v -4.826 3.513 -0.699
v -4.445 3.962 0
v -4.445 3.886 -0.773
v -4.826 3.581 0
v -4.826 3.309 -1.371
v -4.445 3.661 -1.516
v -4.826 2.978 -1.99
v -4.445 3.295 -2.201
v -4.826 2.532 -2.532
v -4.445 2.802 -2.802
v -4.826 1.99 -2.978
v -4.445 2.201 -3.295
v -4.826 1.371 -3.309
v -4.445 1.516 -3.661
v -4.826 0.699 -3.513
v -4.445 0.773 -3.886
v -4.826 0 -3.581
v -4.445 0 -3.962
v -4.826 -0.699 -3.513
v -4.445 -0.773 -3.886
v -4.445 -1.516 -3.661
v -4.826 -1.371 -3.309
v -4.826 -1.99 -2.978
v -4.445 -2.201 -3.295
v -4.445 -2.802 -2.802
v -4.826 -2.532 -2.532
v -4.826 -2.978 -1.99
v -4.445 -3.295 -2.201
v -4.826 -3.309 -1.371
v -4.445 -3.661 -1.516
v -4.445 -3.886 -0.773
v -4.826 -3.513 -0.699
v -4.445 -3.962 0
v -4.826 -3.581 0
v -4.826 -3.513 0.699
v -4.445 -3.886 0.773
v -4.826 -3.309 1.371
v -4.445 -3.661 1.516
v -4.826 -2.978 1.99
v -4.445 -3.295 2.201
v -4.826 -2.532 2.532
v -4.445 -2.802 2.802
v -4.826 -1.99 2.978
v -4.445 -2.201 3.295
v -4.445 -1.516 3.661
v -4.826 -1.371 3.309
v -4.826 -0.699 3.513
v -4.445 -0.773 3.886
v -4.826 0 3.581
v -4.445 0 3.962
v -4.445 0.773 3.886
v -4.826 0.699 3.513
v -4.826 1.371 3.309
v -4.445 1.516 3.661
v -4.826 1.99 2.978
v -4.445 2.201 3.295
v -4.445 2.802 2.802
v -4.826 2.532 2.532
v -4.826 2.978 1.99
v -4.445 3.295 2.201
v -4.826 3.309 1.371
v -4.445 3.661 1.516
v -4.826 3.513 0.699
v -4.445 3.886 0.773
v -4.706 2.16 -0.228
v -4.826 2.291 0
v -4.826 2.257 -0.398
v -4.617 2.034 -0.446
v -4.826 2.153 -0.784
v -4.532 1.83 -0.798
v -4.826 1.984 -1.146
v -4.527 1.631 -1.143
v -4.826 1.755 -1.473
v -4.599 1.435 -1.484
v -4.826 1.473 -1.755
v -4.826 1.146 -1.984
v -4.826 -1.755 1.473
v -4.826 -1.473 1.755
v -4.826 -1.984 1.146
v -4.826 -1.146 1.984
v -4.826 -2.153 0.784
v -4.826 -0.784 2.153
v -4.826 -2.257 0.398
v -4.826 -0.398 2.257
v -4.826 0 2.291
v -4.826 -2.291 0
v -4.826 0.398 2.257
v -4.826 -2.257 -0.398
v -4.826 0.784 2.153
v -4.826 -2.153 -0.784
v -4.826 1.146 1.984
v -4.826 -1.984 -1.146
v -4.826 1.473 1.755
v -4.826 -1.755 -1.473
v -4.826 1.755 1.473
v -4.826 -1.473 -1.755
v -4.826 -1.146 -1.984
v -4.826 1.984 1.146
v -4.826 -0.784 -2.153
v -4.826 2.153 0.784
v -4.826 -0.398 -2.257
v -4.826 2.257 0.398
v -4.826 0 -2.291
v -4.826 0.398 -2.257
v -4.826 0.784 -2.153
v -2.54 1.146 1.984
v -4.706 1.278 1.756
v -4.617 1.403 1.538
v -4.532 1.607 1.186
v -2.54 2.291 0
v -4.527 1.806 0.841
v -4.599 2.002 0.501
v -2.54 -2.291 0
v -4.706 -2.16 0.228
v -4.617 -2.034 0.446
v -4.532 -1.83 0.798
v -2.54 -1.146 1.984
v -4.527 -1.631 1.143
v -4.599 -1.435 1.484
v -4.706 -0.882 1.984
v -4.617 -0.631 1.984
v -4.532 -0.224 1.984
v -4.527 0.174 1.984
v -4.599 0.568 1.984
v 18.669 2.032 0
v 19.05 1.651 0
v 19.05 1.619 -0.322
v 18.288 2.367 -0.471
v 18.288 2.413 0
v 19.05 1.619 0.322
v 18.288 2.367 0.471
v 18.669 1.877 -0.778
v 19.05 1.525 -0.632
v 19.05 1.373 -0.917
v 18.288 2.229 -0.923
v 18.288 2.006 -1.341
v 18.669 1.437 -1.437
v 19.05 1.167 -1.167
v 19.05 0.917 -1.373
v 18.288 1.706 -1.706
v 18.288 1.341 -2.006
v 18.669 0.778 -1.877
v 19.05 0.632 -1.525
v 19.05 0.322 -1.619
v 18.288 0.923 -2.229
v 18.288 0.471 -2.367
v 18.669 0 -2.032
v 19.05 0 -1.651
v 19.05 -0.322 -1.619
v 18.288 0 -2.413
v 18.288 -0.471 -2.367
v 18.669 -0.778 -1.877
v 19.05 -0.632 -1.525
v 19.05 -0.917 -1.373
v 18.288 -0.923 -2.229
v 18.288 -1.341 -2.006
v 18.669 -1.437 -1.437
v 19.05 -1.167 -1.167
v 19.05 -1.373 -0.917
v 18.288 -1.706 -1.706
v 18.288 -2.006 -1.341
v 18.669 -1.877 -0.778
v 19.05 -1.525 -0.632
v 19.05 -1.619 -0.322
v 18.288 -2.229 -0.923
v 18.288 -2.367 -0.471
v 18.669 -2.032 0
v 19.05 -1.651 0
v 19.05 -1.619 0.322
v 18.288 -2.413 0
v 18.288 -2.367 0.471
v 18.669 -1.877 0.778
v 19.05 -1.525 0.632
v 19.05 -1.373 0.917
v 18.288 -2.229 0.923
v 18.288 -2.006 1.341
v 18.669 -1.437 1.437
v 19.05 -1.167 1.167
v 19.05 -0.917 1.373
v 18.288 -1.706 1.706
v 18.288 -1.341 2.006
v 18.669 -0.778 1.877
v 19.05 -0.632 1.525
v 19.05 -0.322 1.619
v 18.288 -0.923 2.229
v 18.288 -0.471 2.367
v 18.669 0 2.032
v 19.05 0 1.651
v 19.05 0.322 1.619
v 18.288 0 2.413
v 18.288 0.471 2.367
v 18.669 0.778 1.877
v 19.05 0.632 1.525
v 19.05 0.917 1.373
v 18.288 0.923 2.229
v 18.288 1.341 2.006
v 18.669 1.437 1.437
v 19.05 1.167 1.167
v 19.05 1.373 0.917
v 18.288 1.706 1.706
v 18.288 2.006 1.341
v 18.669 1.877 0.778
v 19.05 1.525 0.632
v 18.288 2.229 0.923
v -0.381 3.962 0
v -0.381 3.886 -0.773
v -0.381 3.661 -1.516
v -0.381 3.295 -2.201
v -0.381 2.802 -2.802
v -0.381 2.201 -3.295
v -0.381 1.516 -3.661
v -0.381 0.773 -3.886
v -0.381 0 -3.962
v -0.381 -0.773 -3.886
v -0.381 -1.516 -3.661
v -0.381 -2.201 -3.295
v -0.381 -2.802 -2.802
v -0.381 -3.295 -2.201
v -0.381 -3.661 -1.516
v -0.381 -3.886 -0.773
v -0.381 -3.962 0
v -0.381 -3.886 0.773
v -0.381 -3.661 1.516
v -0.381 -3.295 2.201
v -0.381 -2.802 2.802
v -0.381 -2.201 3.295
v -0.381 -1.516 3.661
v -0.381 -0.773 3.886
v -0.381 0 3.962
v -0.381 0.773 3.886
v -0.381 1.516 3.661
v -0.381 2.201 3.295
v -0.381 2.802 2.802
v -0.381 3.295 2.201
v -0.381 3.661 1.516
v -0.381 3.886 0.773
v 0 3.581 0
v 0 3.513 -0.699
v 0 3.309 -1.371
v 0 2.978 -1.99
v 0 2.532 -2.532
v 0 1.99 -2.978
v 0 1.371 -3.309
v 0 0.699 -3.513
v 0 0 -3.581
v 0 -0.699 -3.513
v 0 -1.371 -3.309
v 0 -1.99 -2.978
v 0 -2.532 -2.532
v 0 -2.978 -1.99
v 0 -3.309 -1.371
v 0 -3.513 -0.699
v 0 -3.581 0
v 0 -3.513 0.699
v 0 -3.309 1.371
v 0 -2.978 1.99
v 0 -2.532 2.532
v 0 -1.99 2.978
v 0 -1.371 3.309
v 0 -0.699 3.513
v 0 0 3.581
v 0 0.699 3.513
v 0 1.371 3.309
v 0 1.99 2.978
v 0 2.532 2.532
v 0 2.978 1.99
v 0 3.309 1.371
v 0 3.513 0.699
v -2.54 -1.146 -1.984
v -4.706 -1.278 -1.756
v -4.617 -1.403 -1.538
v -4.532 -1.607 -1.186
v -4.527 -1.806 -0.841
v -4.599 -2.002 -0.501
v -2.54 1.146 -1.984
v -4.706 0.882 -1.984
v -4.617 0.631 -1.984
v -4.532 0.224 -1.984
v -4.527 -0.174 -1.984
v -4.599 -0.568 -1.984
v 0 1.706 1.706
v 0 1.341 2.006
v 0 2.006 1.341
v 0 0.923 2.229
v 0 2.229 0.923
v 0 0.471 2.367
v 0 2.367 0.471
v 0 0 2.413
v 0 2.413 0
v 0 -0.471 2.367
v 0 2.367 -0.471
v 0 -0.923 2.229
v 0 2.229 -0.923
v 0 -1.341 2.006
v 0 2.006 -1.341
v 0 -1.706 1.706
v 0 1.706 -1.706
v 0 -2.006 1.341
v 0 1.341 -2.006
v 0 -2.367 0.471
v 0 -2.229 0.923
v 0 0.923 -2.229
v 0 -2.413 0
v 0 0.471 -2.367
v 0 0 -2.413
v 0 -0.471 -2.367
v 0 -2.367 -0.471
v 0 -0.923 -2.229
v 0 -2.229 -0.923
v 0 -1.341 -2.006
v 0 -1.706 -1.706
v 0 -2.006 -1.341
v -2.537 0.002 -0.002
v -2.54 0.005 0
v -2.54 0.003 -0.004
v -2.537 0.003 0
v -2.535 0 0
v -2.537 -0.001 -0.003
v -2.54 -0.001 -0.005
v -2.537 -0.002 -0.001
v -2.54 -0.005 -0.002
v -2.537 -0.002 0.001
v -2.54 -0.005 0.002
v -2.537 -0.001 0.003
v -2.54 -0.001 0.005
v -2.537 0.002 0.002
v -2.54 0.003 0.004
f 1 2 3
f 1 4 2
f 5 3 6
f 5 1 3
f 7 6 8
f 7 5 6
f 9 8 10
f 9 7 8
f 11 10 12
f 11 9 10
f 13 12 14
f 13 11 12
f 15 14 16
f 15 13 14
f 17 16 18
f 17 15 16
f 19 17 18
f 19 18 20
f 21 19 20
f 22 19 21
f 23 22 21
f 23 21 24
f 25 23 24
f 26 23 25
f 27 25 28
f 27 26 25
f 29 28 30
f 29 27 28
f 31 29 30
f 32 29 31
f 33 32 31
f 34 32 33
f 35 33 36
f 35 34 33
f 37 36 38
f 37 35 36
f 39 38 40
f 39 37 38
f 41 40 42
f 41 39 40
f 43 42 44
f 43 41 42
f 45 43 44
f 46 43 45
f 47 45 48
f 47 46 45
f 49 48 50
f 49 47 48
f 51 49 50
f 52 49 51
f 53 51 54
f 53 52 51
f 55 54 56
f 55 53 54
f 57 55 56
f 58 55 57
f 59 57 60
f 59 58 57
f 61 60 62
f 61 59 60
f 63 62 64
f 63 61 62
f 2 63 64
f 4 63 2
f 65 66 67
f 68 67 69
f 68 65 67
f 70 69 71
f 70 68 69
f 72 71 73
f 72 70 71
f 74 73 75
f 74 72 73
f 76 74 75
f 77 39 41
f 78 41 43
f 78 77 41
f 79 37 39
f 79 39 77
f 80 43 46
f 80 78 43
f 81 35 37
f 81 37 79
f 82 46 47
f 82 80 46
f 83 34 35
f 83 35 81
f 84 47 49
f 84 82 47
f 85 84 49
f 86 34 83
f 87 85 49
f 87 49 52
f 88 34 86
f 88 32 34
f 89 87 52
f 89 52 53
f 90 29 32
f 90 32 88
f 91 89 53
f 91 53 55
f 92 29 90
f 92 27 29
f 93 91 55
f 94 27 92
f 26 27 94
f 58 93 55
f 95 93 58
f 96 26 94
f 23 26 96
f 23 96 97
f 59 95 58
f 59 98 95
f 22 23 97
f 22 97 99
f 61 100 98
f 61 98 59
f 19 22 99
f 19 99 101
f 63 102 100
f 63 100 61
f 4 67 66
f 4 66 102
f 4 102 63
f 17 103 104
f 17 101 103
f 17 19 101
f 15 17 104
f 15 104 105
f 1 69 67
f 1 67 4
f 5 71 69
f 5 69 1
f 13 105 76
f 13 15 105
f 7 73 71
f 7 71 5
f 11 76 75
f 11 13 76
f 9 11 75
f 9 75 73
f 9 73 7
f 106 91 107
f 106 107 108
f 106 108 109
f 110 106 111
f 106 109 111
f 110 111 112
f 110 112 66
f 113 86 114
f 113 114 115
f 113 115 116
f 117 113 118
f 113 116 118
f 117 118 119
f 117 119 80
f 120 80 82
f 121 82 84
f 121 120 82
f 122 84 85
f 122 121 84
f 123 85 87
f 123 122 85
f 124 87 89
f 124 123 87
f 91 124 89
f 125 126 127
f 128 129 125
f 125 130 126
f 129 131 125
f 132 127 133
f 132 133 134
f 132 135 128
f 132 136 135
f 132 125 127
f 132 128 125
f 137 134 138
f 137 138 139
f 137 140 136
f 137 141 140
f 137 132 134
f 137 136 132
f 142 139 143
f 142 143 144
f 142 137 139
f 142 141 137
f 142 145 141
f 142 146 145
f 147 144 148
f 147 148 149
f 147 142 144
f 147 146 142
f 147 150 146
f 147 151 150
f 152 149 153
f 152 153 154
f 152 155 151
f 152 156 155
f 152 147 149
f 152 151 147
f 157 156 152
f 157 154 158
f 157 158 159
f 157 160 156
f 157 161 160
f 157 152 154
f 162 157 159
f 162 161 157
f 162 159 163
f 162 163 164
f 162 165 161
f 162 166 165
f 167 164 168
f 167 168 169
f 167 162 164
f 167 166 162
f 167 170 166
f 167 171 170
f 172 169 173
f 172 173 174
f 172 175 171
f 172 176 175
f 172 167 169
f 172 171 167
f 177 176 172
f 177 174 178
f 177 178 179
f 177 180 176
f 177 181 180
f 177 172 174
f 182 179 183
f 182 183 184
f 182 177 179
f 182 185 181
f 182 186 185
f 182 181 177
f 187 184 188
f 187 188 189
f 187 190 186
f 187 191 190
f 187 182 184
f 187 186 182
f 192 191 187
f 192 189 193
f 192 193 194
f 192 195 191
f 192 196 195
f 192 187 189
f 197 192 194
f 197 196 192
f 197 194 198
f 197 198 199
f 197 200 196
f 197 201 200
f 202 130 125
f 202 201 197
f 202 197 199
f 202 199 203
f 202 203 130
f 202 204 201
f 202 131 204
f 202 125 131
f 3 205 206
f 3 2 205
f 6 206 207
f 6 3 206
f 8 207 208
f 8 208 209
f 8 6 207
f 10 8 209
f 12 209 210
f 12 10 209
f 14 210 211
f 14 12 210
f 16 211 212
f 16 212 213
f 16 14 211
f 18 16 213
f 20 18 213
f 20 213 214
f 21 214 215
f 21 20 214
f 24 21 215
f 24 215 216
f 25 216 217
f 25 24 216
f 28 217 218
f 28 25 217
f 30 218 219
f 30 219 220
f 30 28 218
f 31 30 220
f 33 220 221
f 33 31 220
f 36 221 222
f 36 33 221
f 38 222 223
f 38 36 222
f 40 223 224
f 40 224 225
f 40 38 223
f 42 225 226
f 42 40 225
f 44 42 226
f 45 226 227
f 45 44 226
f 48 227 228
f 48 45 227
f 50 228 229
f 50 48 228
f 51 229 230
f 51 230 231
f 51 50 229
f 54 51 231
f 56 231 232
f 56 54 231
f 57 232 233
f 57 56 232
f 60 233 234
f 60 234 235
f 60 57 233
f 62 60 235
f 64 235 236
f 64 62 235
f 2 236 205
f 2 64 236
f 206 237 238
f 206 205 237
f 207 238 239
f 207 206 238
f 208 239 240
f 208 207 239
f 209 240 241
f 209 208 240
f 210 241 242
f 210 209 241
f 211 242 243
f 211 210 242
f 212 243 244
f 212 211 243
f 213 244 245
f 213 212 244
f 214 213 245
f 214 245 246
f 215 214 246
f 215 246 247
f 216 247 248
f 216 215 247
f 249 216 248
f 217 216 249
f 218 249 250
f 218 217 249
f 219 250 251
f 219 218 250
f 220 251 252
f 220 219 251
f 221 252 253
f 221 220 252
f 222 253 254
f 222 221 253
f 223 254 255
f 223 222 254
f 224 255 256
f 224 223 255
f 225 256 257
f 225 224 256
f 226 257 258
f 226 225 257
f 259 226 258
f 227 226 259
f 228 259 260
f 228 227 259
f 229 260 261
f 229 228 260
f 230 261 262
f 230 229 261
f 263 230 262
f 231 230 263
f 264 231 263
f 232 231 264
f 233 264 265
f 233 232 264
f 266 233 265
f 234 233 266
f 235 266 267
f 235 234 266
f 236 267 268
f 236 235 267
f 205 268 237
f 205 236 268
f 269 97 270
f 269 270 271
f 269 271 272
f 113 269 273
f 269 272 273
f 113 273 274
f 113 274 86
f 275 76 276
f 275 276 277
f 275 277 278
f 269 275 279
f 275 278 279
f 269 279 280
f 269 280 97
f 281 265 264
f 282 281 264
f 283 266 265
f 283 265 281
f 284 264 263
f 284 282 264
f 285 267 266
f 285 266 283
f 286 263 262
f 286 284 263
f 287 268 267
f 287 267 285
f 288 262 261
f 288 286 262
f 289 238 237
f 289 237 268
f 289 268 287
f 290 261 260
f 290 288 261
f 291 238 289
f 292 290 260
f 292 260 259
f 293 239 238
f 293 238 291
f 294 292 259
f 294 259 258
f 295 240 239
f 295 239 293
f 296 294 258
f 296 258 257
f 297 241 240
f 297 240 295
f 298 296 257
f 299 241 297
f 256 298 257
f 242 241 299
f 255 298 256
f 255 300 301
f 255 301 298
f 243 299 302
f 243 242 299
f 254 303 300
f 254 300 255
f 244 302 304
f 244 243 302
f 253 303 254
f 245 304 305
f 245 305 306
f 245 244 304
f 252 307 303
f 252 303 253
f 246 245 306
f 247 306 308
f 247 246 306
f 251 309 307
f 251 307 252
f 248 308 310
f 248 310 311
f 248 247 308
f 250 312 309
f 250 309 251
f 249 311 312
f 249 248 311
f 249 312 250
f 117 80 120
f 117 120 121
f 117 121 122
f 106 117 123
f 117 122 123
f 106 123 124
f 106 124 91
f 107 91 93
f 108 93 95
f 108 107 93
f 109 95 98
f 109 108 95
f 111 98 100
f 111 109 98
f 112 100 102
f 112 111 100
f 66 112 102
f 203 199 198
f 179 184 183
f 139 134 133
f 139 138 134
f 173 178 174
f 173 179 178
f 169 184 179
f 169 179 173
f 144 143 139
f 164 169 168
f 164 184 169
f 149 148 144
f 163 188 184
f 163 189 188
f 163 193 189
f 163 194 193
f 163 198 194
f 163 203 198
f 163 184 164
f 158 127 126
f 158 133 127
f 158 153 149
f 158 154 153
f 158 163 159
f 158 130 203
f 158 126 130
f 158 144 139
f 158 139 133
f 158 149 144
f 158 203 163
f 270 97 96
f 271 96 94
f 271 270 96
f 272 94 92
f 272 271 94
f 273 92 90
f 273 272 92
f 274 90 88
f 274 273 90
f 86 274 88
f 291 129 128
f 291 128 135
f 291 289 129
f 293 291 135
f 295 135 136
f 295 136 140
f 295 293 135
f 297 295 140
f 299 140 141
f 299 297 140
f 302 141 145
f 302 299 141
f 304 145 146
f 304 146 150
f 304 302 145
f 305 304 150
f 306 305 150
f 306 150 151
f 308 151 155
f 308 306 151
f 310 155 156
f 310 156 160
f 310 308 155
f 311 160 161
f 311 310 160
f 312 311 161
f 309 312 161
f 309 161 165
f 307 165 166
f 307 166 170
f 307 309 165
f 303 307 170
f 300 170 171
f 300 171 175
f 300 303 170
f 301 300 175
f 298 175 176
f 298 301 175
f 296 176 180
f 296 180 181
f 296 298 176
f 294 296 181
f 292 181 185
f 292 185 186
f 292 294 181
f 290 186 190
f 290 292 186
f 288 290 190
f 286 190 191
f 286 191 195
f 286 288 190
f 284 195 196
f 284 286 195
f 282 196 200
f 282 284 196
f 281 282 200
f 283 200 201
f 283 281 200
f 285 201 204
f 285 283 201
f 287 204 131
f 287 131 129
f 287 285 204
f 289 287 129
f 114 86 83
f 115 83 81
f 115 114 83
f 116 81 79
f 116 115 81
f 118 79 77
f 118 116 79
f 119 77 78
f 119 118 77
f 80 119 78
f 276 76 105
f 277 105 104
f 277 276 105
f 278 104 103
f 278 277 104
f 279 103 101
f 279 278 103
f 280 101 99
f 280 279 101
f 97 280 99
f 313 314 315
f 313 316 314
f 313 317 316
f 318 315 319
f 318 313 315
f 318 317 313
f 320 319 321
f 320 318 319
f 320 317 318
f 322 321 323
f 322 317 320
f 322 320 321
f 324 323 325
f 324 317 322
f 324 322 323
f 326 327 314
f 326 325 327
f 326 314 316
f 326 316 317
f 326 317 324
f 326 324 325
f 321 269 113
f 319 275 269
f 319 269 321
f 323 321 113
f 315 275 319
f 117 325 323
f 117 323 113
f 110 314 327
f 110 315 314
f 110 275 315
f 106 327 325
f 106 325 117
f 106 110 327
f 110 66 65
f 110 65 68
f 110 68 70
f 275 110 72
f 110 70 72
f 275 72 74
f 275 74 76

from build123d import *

# Parameters (mm, degrees)
CUT_EXTRUDE1_DEPTH = 2.286


with BuildPart() as part:
    # Sketch1 → Revolve1 (revolve)
    with BuildSketch(Plane.XY):
        Polygon((0, 2.413), (0, 3.5814), (-0.381, 3.9624), (-4.445, 3.9624), (-4.826, 3.5814), (-4.826, 2.291358881), (-2.534641119, 0), (19.05, 0), (19.05, 1.651), (18.288, 2.413), align=None)
    revolve(axis=Axis((-2.534641119, 0, 0), (-1, 0, 0)))

    # Sketch2 → Cut-Extrude1 (cut)
    with BuildSketch(Plane.ZY.offset(4.826)):
        Polygon((0, 2.291358881), (-1.984375, 1.14567944), (-1.984375, -1.14567944), (0, -2.291358881), (1.984375, -1.14567944), (1.984375, 1.14567944), align=None)
    extrude(amount=-CUT_EXTRUDE1_DEPTH, mode=Mode.SUBTRACT)


solid = part.part
